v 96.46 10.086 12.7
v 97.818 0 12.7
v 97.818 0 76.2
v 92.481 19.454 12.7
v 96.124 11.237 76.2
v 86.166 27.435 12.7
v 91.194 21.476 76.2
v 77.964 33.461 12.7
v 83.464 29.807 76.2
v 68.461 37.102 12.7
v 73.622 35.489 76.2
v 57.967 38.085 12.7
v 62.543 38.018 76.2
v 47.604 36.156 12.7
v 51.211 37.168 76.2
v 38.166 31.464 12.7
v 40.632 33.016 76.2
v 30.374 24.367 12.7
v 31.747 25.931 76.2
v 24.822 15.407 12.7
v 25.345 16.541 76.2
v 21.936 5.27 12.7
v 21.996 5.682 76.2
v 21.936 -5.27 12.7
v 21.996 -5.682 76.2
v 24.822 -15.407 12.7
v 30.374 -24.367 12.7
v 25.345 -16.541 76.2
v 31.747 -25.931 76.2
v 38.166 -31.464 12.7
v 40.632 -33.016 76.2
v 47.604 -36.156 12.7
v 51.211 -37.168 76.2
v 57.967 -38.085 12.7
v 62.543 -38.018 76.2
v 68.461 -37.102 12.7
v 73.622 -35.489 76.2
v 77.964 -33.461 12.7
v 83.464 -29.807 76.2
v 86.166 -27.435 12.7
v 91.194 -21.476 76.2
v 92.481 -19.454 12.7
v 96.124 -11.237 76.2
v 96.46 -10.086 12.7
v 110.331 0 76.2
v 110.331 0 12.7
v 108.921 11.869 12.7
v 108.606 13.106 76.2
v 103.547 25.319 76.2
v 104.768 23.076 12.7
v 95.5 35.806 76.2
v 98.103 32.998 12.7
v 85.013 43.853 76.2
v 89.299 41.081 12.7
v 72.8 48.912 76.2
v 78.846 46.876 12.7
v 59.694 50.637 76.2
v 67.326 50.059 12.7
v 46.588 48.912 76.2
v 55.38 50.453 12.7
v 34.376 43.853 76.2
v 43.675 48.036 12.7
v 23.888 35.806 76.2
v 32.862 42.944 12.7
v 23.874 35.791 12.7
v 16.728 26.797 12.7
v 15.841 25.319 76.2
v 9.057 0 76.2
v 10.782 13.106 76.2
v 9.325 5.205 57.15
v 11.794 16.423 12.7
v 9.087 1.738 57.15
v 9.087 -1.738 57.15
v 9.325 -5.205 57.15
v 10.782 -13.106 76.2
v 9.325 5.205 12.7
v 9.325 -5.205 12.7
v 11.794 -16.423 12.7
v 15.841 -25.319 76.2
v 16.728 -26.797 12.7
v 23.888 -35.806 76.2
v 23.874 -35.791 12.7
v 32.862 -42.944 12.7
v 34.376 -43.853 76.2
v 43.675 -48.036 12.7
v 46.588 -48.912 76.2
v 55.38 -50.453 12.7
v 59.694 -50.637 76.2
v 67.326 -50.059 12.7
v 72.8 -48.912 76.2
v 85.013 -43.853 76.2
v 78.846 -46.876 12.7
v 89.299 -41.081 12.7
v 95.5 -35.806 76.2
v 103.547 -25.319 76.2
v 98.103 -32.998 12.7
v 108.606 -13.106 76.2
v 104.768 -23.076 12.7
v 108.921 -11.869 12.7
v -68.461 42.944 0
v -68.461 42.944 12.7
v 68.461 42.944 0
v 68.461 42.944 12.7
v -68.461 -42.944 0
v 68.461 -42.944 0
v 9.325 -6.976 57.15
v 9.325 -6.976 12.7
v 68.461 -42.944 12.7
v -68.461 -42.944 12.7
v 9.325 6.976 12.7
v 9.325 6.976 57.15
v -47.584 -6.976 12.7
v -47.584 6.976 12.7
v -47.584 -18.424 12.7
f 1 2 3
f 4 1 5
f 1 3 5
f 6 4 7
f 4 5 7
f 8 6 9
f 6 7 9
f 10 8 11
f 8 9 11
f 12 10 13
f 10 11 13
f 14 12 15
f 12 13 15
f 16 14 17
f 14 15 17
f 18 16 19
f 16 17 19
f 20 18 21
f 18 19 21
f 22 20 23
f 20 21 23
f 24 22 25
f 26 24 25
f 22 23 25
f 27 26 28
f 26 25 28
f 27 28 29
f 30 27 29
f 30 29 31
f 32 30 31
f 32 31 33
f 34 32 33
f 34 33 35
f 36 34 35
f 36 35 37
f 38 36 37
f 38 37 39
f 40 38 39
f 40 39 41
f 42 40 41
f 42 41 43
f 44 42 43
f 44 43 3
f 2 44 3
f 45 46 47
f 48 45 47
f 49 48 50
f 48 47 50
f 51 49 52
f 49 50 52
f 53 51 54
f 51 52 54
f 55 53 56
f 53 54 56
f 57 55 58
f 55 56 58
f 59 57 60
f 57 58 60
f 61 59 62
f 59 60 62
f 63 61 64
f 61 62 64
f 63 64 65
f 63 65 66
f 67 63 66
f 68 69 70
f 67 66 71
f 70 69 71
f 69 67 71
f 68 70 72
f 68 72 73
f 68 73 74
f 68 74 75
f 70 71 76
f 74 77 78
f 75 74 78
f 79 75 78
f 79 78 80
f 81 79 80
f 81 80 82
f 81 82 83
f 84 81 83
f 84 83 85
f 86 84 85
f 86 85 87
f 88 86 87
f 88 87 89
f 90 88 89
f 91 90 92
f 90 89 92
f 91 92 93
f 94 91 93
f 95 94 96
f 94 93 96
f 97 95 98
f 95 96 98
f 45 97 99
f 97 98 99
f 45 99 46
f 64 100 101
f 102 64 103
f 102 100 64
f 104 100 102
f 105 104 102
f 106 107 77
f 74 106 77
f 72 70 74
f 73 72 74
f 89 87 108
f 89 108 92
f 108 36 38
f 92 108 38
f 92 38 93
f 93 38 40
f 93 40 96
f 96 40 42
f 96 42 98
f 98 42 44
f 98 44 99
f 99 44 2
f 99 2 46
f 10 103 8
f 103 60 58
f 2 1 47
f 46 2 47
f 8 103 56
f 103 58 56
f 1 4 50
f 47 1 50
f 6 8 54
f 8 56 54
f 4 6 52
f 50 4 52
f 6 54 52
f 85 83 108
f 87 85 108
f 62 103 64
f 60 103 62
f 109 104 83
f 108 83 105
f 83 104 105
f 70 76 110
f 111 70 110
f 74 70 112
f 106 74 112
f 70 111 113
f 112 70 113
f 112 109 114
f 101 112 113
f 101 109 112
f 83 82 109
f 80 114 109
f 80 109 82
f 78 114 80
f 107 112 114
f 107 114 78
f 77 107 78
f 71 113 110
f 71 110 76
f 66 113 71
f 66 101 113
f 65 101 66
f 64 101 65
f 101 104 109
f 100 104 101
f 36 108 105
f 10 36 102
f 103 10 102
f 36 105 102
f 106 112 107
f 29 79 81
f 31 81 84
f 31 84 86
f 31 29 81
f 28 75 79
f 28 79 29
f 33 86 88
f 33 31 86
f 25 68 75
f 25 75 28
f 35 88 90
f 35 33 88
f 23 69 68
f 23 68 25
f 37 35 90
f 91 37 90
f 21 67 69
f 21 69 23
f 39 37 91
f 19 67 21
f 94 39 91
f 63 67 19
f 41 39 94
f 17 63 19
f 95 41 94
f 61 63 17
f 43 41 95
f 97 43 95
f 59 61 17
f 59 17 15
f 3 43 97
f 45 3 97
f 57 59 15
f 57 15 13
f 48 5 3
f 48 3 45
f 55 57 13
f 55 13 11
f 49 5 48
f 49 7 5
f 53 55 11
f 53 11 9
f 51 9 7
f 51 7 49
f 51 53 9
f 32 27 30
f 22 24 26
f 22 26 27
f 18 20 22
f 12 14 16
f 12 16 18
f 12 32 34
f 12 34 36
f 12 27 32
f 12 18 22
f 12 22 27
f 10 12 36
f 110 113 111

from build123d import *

# Parameters (mm, degrees)
F0_W     = 136.9216442108
F0_H     = 85.8872830868
F1_DEPTH = 12.7
F3_DEPTH = 63.5
F4_R     = 38.1241365852
F5_DEPTH = 63.5
F6_W     = 56.9095164537
F6_H     = 13.9519274235
F7_DEPTH = 44.45
F9_DEPTH = 25.4


with BuildPart() as f1:
    # F0 (on Top) → F1 (new body)
    with BuildSketch(Plane.XY):
        Rectangle(F0_W, F0_H)
    extrude(amount=F1_DEPTH)

    # F2 (on face) → F3 (join)
    with BuildSketch(Plane.XY.offset(12.7)):
        with BuildLine():
            ThreePointArc((32.8620942883, -42.9436415434), (84.2442332892, -44.2877306594), (110.3311590742, 0))
            ThreePointArc((110.3311590742, 0), (84.2442332892, 44.2877306594), (32.8620942883, 42.9436415434))
            Line((32.8620942883, 42.9436415434), (68.4608221054, 42.9436415434))
            Line((68.4608221054, 42.9436415434), (68.4608221054, -42.9436415434))
            Line((68.4608221054, -42.9436415434), (32.8620942883, -42.9436415434))
        make_face()
        with BuildLine():
            Line((68.4608221054, 42.9436415434), (32.8620942883, 42.9436415434))
            ThreePointArc((32.8620942883, 42.9436415434), (9.0570263673, 0), (32.8620942883, -42.9436415434))
            Line((32.8620942883, -42.9436415434), (68.4608221054, -42.9436415434))
            Line((68.4608221054, -42.9436415434), (68.4608221054, 42.9436415434))
        make_face()
    extrude(amount=F3_DEPTH)

    # F4 (on face) → F5 (cut)
    with BuildSketch(Plane.XY.offset(76.2)):
        with Locations((59.6940927207, 0)):
            Circle(F4_R)
    extrude(amount=-F5_DEPTH, mode=Mode.SUBTRACT)

    # F6 (on face) → F7 (join)
    with BuildSketch(Plane.XY.offset(12.7)):
        with Locations((-19.1295444965, 0)):
            Rectangle(F6_W, F6_H)
    extrude(amount=F7_DEPTH)

    # F8 (on face) → F9 (cut)
    with BuildSketch(Plane(origin=(0, 6.9759637117, 0), x_dir=(-1, 0, 0), z_dir=(0, 1, 0))):
        Polygon((47.5843027234, 57.15), (-9.3252137303, 57.15), (47.5843027234, 12.7), align=None)
    extrude(amount=-F9_DEPTH, mode=Mode.SUBTRACT)


solid = f1.part
